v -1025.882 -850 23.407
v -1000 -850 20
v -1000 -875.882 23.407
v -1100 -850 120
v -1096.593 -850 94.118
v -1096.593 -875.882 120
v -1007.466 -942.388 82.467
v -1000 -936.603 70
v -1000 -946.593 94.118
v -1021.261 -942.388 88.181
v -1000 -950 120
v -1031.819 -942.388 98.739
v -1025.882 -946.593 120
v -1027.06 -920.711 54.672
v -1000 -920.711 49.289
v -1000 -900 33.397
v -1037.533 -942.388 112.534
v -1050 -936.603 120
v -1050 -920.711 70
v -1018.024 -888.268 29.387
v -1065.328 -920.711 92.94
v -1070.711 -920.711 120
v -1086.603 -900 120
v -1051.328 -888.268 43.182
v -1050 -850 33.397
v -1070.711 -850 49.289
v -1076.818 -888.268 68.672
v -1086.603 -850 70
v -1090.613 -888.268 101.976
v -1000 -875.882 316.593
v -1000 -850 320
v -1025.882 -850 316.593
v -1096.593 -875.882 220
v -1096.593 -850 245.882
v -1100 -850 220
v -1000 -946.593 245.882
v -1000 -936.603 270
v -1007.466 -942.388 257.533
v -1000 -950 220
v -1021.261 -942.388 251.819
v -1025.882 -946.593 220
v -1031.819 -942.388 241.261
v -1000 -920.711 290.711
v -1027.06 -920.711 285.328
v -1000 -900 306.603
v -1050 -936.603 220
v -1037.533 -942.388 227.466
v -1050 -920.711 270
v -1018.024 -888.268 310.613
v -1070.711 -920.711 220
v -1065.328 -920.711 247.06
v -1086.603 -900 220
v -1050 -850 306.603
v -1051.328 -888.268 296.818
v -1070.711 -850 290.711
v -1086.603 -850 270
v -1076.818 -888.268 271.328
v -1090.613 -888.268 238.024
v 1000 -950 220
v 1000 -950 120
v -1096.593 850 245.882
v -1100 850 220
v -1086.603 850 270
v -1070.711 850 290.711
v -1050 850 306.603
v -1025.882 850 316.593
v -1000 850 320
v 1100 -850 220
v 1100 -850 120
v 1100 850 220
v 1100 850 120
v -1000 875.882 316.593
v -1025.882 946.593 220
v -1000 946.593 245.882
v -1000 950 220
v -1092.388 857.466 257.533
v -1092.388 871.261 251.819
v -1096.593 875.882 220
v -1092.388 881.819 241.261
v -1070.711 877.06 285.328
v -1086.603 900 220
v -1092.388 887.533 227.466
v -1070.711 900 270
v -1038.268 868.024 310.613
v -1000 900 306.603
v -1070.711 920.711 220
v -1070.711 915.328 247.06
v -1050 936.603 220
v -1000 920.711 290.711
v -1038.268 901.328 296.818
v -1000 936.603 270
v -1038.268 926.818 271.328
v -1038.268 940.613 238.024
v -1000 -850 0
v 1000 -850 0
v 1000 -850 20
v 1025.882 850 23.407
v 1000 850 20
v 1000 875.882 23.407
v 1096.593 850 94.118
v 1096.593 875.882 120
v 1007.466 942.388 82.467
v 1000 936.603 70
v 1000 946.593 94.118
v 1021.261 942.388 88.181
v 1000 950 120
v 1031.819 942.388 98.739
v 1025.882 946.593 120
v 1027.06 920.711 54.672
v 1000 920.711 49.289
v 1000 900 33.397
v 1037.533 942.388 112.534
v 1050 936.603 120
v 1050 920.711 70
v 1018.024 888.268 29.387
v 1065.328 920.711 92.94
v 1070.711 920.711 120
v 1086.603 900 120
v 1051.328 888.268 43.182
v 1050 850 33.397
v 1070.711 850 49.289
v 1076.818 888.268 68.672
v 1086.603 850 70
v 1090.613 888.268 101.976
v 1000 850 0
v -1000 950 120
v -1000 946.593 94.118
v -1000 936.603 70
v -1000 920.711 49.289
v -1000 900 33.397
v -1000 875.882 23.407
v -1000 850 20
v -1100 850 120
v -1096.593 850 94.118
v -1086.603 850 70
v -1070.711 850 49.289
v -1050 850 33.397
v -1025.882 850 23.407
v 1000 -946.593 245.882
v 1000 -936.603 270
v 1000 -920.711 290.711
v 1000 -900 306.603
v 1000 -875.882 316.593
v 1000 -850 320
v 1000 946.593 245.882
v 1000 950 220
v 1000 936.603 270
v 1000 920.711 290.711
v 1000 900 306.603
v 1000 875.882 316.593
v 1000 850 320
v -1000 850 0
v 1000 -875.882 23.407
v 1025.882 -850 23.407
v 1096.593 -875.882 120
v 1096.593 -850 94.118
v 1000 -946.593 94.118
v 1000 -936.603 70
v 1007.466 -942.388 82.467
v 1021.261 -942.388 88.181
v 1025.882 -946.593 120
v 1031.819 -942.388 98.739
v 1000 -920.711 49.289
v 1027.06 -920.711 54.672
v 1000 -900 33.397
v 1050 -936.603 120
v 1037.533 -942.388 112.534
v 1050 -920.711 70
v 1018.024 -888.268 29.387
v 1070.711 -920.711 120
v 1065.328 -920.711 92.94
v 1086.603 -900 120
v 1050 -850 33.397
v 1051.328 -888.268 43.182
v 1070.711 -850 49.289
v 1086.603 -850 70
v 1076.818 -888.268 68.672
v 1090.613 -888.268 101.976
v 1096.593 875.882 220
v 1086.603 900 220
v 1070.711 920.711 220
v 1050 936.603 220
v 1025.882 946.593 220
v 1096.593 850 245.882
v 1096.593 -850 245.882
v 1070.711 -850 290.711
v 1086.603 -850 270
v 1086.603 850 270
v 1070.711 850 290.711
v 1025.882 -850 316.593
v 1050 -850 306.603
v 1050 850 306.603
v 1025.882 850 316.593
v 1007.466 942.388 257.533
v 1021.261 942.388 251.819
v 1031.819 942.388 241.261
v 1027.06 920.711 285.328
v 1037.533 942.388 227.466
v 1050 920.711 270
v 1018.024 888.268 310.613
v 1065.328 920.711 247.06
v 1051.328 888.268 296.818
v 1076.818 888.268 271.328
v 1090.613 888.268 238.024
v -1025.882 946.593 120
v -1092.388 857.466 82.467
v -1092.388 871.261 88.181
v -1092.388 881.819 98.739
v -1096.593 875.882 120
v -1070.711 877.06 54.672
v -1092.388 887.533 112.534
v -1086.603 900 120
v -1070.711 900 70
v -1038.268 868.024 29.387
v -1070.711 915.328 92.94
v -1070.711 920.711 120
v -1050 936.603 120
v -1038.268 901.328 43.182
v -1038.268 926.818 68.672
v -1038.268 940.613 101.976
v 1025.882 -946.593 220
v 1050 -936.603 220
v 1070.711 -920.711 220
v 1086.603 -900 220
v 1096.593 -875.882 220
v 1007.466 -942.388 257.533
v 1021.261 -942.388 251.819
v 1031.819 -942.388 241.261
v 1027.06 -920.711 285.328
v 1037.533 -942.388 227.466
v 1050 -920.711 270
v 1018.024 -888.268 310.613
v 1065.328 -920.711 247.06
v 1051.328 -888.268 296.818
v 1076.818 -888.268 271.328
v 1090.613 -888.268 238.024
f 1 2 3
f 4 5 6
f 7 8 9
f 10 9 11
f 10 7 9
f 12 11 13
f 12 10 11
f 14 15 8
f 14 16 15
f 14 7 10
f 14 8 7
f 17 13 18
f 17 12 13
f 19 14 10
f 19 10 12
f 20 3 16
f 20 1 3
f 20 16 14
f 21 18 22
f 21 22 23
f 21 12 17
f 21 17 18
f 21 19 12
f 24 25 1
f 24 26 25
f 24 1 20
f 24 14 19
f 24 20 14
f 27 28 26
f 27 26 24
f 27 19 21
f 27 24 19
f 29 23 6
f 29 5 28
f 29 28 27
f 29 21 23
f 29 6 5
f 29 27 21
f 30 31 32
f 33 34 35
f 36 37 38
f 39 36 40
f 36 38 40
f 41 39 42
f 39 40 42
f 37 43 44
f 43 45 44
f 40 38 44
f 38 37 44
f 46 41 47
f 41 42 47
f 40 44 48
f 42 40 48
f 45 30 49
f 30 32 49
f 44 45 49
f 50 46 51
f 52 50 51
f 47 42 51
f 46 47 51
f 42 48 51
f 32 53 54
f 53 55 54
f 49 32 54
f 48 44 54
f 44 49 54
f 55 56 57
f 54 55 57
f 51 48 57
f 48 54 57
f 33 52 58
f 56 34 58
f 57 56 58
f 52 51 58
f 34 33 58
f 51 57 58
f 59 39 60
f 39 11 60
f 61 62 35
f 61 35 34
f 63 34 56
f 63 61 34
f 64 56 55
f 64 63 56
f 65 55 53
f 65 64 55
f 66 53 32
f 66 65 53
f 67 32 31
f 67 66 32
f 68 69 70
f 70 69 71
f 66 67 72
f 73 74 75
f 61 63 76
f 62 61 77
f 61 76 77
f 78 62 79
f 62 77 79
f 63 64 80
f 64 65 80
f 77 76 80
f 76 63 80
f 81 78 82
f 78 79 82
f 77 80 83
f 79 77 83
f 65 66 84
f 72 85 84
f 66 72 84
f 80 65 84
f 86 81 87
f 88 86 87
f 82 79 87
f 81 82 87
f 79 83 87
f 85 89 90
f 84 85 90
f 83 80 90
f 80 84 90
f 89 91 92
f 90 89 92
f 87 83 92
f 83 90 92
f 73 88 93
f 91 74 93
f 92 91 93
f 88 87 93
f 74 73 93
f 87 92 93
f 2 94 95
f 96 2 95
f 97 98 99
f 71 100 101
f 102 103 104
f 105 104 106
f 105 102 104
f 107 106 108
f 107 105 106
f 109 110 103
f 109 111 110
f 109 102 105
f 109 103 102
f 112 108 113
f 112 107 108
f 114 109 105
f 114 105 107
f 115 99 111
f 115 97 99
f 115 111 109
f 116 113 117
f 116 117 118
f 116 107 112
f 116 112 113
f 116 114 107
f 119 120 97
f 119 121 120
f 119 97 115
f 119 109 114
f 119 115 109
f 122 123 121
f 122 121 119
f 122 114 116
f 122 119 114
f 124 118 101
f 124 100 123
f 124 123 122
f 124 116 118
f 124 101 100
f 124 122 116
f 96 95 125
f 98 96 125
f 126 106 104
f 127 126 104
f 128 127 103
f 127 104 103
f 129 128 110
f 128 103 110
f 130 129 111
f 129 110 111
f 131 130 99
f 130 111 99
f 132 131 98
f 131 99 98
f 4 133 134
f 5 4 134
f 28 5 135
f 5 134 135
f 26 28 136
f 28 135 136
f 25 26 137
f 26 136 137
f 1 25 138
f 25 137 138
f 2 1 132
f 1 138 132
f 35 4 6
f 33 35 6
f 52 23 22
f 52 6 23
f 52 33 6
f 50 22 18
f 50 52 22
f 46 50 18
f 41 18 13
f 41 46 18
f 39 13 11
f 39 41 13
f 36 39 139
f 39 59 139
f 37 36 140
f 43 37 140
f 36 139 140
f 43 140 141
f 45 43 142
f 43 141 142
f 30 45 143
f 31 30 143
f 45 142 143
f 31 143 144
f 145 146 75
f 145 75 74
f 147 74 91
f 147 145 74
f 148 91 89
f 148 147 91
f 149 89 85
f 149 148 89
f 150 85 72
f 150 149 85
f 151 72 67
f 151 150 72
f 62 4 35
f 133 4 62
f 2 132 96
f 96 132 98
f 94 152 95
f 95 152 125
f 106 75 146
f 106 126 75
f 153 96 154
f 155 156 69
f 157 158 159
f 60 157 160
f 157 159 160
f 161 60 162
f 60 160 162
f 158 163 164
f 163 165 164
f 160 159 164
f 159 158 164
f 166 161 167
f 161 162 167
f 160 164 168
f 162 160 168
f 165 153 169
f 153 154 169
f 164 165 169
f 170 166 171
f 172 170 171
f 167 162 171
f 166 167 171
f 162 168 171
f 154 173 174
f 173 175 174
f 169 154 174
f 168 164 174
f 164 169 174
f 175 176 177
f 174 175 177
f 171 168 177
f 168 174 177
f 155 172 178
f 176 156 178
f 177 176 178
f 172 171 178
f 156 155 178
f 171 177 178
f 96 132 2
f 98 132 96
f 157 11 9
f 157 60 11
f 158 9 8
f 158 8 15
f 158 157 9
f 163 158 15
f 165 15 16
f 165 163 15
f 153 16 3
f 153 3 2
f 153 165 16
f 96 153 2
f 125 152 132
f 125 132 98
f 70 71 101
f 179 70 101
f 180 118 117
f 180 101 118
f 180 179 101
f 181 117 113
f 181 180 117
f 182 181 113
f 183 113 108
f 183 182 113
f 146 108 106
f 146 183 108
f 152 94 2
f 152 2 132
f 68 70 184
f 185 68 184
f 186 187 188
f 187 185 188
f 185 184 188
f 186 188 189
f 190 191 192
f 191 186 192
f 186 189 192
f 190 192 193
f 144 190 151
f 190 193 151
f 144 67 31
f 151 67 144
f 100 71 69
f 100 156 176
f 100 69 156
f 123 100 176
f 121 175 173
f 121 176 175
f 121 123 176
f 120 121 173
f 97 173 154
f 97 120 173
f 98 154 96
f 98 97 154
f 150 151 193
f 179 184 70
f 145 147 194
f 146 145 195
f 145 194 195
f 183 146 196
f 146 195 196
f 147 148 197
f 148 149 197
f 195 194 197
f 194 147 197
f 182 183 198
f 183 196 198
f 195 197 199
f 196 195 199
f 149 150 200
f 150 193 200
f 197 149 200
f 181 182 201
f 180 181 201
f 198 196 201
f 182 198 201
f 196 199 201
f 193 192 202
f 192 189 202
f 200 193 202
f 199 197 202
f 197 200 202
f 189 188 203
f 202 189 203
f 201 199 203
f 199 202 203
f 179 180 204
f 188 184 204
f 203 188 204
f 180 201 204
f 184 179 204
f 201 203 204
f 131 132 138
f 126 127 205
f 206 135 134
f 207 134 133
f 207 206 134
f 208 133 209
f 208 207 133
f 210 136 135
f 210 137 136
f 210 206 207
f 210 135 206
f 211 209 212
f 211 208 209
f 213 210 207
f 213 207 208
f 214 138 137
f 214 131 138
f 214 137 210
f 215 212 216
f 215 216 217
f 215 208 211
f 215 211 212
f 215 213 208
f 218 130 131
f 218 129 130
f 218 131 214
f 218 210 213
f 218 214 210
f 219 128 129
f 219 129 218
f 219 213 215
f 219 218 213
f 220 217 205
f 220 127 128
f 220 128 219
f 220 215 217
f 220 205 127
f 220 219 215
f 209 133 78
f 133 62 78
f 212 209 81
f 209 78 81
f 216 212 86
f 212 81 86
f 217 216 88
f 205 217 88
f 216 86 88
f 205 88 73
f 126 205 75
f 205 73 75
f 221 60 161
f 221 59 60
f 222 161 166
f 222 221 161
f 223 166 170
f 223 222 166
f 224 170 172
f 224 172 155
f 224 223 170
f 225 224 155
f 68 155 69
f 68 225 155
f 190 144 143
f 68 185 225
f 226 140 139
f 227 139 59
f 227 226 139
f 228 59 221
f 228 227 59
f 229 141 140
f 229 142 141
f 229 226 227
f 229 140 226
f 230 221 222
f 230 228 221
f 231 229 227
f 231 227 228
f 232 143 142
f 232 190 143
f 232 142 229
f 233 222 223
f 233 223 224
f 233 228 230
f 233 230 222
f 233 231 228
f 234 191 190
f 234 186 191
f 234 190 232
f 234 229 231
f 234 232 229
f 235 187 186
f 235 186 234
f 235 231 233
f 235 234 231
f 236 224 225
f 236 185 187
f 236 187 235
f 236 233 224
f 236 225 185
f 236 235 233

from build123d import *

# Parameters (mm, degrees)
F0_W     = 2000
F0_H     = 1700
F1_DEPTH = 20
F2_W     = 2200
F2_H     = 1900
F3_DEPTH = 300
F4_R     = 100


with BuildPart() as f1:
    # F0 (on Top) → F1 (new body)
    with BuildSketch(Plane.XY):
        Rectangle(F0_W, F0_H)
    extrude(amount=F1_DEPTH)


with BuildPart() as f3:
    # F2 (on face) → F3 (new body)
    with BuildSketch(Plane.XY.offset(20)):
        Rectangle(F2_W, F2_H)
    extrude(amount=F3_DEPTH)

    # F4
    f4_edges = [f3.edges().sort_by_distance(p)[0] for p in [
        (1100, 0, 320),
        (0, 950, 320),
        (-1100, 0, 320),
        (0, -950, 320),
        (1100, 0, 20),
        (0, 950, 20),
        (-1100, 0, 20),
        (0, -950, 20),
        (1100, -950, 170),
        (1100, 950, 170),
        (-1100, 950, 170),
        (-1100, -950, 170),
    ]]
    fillet(f4_edges, radius=F4_R)


solid = Compound([f1.part, f3.part])
